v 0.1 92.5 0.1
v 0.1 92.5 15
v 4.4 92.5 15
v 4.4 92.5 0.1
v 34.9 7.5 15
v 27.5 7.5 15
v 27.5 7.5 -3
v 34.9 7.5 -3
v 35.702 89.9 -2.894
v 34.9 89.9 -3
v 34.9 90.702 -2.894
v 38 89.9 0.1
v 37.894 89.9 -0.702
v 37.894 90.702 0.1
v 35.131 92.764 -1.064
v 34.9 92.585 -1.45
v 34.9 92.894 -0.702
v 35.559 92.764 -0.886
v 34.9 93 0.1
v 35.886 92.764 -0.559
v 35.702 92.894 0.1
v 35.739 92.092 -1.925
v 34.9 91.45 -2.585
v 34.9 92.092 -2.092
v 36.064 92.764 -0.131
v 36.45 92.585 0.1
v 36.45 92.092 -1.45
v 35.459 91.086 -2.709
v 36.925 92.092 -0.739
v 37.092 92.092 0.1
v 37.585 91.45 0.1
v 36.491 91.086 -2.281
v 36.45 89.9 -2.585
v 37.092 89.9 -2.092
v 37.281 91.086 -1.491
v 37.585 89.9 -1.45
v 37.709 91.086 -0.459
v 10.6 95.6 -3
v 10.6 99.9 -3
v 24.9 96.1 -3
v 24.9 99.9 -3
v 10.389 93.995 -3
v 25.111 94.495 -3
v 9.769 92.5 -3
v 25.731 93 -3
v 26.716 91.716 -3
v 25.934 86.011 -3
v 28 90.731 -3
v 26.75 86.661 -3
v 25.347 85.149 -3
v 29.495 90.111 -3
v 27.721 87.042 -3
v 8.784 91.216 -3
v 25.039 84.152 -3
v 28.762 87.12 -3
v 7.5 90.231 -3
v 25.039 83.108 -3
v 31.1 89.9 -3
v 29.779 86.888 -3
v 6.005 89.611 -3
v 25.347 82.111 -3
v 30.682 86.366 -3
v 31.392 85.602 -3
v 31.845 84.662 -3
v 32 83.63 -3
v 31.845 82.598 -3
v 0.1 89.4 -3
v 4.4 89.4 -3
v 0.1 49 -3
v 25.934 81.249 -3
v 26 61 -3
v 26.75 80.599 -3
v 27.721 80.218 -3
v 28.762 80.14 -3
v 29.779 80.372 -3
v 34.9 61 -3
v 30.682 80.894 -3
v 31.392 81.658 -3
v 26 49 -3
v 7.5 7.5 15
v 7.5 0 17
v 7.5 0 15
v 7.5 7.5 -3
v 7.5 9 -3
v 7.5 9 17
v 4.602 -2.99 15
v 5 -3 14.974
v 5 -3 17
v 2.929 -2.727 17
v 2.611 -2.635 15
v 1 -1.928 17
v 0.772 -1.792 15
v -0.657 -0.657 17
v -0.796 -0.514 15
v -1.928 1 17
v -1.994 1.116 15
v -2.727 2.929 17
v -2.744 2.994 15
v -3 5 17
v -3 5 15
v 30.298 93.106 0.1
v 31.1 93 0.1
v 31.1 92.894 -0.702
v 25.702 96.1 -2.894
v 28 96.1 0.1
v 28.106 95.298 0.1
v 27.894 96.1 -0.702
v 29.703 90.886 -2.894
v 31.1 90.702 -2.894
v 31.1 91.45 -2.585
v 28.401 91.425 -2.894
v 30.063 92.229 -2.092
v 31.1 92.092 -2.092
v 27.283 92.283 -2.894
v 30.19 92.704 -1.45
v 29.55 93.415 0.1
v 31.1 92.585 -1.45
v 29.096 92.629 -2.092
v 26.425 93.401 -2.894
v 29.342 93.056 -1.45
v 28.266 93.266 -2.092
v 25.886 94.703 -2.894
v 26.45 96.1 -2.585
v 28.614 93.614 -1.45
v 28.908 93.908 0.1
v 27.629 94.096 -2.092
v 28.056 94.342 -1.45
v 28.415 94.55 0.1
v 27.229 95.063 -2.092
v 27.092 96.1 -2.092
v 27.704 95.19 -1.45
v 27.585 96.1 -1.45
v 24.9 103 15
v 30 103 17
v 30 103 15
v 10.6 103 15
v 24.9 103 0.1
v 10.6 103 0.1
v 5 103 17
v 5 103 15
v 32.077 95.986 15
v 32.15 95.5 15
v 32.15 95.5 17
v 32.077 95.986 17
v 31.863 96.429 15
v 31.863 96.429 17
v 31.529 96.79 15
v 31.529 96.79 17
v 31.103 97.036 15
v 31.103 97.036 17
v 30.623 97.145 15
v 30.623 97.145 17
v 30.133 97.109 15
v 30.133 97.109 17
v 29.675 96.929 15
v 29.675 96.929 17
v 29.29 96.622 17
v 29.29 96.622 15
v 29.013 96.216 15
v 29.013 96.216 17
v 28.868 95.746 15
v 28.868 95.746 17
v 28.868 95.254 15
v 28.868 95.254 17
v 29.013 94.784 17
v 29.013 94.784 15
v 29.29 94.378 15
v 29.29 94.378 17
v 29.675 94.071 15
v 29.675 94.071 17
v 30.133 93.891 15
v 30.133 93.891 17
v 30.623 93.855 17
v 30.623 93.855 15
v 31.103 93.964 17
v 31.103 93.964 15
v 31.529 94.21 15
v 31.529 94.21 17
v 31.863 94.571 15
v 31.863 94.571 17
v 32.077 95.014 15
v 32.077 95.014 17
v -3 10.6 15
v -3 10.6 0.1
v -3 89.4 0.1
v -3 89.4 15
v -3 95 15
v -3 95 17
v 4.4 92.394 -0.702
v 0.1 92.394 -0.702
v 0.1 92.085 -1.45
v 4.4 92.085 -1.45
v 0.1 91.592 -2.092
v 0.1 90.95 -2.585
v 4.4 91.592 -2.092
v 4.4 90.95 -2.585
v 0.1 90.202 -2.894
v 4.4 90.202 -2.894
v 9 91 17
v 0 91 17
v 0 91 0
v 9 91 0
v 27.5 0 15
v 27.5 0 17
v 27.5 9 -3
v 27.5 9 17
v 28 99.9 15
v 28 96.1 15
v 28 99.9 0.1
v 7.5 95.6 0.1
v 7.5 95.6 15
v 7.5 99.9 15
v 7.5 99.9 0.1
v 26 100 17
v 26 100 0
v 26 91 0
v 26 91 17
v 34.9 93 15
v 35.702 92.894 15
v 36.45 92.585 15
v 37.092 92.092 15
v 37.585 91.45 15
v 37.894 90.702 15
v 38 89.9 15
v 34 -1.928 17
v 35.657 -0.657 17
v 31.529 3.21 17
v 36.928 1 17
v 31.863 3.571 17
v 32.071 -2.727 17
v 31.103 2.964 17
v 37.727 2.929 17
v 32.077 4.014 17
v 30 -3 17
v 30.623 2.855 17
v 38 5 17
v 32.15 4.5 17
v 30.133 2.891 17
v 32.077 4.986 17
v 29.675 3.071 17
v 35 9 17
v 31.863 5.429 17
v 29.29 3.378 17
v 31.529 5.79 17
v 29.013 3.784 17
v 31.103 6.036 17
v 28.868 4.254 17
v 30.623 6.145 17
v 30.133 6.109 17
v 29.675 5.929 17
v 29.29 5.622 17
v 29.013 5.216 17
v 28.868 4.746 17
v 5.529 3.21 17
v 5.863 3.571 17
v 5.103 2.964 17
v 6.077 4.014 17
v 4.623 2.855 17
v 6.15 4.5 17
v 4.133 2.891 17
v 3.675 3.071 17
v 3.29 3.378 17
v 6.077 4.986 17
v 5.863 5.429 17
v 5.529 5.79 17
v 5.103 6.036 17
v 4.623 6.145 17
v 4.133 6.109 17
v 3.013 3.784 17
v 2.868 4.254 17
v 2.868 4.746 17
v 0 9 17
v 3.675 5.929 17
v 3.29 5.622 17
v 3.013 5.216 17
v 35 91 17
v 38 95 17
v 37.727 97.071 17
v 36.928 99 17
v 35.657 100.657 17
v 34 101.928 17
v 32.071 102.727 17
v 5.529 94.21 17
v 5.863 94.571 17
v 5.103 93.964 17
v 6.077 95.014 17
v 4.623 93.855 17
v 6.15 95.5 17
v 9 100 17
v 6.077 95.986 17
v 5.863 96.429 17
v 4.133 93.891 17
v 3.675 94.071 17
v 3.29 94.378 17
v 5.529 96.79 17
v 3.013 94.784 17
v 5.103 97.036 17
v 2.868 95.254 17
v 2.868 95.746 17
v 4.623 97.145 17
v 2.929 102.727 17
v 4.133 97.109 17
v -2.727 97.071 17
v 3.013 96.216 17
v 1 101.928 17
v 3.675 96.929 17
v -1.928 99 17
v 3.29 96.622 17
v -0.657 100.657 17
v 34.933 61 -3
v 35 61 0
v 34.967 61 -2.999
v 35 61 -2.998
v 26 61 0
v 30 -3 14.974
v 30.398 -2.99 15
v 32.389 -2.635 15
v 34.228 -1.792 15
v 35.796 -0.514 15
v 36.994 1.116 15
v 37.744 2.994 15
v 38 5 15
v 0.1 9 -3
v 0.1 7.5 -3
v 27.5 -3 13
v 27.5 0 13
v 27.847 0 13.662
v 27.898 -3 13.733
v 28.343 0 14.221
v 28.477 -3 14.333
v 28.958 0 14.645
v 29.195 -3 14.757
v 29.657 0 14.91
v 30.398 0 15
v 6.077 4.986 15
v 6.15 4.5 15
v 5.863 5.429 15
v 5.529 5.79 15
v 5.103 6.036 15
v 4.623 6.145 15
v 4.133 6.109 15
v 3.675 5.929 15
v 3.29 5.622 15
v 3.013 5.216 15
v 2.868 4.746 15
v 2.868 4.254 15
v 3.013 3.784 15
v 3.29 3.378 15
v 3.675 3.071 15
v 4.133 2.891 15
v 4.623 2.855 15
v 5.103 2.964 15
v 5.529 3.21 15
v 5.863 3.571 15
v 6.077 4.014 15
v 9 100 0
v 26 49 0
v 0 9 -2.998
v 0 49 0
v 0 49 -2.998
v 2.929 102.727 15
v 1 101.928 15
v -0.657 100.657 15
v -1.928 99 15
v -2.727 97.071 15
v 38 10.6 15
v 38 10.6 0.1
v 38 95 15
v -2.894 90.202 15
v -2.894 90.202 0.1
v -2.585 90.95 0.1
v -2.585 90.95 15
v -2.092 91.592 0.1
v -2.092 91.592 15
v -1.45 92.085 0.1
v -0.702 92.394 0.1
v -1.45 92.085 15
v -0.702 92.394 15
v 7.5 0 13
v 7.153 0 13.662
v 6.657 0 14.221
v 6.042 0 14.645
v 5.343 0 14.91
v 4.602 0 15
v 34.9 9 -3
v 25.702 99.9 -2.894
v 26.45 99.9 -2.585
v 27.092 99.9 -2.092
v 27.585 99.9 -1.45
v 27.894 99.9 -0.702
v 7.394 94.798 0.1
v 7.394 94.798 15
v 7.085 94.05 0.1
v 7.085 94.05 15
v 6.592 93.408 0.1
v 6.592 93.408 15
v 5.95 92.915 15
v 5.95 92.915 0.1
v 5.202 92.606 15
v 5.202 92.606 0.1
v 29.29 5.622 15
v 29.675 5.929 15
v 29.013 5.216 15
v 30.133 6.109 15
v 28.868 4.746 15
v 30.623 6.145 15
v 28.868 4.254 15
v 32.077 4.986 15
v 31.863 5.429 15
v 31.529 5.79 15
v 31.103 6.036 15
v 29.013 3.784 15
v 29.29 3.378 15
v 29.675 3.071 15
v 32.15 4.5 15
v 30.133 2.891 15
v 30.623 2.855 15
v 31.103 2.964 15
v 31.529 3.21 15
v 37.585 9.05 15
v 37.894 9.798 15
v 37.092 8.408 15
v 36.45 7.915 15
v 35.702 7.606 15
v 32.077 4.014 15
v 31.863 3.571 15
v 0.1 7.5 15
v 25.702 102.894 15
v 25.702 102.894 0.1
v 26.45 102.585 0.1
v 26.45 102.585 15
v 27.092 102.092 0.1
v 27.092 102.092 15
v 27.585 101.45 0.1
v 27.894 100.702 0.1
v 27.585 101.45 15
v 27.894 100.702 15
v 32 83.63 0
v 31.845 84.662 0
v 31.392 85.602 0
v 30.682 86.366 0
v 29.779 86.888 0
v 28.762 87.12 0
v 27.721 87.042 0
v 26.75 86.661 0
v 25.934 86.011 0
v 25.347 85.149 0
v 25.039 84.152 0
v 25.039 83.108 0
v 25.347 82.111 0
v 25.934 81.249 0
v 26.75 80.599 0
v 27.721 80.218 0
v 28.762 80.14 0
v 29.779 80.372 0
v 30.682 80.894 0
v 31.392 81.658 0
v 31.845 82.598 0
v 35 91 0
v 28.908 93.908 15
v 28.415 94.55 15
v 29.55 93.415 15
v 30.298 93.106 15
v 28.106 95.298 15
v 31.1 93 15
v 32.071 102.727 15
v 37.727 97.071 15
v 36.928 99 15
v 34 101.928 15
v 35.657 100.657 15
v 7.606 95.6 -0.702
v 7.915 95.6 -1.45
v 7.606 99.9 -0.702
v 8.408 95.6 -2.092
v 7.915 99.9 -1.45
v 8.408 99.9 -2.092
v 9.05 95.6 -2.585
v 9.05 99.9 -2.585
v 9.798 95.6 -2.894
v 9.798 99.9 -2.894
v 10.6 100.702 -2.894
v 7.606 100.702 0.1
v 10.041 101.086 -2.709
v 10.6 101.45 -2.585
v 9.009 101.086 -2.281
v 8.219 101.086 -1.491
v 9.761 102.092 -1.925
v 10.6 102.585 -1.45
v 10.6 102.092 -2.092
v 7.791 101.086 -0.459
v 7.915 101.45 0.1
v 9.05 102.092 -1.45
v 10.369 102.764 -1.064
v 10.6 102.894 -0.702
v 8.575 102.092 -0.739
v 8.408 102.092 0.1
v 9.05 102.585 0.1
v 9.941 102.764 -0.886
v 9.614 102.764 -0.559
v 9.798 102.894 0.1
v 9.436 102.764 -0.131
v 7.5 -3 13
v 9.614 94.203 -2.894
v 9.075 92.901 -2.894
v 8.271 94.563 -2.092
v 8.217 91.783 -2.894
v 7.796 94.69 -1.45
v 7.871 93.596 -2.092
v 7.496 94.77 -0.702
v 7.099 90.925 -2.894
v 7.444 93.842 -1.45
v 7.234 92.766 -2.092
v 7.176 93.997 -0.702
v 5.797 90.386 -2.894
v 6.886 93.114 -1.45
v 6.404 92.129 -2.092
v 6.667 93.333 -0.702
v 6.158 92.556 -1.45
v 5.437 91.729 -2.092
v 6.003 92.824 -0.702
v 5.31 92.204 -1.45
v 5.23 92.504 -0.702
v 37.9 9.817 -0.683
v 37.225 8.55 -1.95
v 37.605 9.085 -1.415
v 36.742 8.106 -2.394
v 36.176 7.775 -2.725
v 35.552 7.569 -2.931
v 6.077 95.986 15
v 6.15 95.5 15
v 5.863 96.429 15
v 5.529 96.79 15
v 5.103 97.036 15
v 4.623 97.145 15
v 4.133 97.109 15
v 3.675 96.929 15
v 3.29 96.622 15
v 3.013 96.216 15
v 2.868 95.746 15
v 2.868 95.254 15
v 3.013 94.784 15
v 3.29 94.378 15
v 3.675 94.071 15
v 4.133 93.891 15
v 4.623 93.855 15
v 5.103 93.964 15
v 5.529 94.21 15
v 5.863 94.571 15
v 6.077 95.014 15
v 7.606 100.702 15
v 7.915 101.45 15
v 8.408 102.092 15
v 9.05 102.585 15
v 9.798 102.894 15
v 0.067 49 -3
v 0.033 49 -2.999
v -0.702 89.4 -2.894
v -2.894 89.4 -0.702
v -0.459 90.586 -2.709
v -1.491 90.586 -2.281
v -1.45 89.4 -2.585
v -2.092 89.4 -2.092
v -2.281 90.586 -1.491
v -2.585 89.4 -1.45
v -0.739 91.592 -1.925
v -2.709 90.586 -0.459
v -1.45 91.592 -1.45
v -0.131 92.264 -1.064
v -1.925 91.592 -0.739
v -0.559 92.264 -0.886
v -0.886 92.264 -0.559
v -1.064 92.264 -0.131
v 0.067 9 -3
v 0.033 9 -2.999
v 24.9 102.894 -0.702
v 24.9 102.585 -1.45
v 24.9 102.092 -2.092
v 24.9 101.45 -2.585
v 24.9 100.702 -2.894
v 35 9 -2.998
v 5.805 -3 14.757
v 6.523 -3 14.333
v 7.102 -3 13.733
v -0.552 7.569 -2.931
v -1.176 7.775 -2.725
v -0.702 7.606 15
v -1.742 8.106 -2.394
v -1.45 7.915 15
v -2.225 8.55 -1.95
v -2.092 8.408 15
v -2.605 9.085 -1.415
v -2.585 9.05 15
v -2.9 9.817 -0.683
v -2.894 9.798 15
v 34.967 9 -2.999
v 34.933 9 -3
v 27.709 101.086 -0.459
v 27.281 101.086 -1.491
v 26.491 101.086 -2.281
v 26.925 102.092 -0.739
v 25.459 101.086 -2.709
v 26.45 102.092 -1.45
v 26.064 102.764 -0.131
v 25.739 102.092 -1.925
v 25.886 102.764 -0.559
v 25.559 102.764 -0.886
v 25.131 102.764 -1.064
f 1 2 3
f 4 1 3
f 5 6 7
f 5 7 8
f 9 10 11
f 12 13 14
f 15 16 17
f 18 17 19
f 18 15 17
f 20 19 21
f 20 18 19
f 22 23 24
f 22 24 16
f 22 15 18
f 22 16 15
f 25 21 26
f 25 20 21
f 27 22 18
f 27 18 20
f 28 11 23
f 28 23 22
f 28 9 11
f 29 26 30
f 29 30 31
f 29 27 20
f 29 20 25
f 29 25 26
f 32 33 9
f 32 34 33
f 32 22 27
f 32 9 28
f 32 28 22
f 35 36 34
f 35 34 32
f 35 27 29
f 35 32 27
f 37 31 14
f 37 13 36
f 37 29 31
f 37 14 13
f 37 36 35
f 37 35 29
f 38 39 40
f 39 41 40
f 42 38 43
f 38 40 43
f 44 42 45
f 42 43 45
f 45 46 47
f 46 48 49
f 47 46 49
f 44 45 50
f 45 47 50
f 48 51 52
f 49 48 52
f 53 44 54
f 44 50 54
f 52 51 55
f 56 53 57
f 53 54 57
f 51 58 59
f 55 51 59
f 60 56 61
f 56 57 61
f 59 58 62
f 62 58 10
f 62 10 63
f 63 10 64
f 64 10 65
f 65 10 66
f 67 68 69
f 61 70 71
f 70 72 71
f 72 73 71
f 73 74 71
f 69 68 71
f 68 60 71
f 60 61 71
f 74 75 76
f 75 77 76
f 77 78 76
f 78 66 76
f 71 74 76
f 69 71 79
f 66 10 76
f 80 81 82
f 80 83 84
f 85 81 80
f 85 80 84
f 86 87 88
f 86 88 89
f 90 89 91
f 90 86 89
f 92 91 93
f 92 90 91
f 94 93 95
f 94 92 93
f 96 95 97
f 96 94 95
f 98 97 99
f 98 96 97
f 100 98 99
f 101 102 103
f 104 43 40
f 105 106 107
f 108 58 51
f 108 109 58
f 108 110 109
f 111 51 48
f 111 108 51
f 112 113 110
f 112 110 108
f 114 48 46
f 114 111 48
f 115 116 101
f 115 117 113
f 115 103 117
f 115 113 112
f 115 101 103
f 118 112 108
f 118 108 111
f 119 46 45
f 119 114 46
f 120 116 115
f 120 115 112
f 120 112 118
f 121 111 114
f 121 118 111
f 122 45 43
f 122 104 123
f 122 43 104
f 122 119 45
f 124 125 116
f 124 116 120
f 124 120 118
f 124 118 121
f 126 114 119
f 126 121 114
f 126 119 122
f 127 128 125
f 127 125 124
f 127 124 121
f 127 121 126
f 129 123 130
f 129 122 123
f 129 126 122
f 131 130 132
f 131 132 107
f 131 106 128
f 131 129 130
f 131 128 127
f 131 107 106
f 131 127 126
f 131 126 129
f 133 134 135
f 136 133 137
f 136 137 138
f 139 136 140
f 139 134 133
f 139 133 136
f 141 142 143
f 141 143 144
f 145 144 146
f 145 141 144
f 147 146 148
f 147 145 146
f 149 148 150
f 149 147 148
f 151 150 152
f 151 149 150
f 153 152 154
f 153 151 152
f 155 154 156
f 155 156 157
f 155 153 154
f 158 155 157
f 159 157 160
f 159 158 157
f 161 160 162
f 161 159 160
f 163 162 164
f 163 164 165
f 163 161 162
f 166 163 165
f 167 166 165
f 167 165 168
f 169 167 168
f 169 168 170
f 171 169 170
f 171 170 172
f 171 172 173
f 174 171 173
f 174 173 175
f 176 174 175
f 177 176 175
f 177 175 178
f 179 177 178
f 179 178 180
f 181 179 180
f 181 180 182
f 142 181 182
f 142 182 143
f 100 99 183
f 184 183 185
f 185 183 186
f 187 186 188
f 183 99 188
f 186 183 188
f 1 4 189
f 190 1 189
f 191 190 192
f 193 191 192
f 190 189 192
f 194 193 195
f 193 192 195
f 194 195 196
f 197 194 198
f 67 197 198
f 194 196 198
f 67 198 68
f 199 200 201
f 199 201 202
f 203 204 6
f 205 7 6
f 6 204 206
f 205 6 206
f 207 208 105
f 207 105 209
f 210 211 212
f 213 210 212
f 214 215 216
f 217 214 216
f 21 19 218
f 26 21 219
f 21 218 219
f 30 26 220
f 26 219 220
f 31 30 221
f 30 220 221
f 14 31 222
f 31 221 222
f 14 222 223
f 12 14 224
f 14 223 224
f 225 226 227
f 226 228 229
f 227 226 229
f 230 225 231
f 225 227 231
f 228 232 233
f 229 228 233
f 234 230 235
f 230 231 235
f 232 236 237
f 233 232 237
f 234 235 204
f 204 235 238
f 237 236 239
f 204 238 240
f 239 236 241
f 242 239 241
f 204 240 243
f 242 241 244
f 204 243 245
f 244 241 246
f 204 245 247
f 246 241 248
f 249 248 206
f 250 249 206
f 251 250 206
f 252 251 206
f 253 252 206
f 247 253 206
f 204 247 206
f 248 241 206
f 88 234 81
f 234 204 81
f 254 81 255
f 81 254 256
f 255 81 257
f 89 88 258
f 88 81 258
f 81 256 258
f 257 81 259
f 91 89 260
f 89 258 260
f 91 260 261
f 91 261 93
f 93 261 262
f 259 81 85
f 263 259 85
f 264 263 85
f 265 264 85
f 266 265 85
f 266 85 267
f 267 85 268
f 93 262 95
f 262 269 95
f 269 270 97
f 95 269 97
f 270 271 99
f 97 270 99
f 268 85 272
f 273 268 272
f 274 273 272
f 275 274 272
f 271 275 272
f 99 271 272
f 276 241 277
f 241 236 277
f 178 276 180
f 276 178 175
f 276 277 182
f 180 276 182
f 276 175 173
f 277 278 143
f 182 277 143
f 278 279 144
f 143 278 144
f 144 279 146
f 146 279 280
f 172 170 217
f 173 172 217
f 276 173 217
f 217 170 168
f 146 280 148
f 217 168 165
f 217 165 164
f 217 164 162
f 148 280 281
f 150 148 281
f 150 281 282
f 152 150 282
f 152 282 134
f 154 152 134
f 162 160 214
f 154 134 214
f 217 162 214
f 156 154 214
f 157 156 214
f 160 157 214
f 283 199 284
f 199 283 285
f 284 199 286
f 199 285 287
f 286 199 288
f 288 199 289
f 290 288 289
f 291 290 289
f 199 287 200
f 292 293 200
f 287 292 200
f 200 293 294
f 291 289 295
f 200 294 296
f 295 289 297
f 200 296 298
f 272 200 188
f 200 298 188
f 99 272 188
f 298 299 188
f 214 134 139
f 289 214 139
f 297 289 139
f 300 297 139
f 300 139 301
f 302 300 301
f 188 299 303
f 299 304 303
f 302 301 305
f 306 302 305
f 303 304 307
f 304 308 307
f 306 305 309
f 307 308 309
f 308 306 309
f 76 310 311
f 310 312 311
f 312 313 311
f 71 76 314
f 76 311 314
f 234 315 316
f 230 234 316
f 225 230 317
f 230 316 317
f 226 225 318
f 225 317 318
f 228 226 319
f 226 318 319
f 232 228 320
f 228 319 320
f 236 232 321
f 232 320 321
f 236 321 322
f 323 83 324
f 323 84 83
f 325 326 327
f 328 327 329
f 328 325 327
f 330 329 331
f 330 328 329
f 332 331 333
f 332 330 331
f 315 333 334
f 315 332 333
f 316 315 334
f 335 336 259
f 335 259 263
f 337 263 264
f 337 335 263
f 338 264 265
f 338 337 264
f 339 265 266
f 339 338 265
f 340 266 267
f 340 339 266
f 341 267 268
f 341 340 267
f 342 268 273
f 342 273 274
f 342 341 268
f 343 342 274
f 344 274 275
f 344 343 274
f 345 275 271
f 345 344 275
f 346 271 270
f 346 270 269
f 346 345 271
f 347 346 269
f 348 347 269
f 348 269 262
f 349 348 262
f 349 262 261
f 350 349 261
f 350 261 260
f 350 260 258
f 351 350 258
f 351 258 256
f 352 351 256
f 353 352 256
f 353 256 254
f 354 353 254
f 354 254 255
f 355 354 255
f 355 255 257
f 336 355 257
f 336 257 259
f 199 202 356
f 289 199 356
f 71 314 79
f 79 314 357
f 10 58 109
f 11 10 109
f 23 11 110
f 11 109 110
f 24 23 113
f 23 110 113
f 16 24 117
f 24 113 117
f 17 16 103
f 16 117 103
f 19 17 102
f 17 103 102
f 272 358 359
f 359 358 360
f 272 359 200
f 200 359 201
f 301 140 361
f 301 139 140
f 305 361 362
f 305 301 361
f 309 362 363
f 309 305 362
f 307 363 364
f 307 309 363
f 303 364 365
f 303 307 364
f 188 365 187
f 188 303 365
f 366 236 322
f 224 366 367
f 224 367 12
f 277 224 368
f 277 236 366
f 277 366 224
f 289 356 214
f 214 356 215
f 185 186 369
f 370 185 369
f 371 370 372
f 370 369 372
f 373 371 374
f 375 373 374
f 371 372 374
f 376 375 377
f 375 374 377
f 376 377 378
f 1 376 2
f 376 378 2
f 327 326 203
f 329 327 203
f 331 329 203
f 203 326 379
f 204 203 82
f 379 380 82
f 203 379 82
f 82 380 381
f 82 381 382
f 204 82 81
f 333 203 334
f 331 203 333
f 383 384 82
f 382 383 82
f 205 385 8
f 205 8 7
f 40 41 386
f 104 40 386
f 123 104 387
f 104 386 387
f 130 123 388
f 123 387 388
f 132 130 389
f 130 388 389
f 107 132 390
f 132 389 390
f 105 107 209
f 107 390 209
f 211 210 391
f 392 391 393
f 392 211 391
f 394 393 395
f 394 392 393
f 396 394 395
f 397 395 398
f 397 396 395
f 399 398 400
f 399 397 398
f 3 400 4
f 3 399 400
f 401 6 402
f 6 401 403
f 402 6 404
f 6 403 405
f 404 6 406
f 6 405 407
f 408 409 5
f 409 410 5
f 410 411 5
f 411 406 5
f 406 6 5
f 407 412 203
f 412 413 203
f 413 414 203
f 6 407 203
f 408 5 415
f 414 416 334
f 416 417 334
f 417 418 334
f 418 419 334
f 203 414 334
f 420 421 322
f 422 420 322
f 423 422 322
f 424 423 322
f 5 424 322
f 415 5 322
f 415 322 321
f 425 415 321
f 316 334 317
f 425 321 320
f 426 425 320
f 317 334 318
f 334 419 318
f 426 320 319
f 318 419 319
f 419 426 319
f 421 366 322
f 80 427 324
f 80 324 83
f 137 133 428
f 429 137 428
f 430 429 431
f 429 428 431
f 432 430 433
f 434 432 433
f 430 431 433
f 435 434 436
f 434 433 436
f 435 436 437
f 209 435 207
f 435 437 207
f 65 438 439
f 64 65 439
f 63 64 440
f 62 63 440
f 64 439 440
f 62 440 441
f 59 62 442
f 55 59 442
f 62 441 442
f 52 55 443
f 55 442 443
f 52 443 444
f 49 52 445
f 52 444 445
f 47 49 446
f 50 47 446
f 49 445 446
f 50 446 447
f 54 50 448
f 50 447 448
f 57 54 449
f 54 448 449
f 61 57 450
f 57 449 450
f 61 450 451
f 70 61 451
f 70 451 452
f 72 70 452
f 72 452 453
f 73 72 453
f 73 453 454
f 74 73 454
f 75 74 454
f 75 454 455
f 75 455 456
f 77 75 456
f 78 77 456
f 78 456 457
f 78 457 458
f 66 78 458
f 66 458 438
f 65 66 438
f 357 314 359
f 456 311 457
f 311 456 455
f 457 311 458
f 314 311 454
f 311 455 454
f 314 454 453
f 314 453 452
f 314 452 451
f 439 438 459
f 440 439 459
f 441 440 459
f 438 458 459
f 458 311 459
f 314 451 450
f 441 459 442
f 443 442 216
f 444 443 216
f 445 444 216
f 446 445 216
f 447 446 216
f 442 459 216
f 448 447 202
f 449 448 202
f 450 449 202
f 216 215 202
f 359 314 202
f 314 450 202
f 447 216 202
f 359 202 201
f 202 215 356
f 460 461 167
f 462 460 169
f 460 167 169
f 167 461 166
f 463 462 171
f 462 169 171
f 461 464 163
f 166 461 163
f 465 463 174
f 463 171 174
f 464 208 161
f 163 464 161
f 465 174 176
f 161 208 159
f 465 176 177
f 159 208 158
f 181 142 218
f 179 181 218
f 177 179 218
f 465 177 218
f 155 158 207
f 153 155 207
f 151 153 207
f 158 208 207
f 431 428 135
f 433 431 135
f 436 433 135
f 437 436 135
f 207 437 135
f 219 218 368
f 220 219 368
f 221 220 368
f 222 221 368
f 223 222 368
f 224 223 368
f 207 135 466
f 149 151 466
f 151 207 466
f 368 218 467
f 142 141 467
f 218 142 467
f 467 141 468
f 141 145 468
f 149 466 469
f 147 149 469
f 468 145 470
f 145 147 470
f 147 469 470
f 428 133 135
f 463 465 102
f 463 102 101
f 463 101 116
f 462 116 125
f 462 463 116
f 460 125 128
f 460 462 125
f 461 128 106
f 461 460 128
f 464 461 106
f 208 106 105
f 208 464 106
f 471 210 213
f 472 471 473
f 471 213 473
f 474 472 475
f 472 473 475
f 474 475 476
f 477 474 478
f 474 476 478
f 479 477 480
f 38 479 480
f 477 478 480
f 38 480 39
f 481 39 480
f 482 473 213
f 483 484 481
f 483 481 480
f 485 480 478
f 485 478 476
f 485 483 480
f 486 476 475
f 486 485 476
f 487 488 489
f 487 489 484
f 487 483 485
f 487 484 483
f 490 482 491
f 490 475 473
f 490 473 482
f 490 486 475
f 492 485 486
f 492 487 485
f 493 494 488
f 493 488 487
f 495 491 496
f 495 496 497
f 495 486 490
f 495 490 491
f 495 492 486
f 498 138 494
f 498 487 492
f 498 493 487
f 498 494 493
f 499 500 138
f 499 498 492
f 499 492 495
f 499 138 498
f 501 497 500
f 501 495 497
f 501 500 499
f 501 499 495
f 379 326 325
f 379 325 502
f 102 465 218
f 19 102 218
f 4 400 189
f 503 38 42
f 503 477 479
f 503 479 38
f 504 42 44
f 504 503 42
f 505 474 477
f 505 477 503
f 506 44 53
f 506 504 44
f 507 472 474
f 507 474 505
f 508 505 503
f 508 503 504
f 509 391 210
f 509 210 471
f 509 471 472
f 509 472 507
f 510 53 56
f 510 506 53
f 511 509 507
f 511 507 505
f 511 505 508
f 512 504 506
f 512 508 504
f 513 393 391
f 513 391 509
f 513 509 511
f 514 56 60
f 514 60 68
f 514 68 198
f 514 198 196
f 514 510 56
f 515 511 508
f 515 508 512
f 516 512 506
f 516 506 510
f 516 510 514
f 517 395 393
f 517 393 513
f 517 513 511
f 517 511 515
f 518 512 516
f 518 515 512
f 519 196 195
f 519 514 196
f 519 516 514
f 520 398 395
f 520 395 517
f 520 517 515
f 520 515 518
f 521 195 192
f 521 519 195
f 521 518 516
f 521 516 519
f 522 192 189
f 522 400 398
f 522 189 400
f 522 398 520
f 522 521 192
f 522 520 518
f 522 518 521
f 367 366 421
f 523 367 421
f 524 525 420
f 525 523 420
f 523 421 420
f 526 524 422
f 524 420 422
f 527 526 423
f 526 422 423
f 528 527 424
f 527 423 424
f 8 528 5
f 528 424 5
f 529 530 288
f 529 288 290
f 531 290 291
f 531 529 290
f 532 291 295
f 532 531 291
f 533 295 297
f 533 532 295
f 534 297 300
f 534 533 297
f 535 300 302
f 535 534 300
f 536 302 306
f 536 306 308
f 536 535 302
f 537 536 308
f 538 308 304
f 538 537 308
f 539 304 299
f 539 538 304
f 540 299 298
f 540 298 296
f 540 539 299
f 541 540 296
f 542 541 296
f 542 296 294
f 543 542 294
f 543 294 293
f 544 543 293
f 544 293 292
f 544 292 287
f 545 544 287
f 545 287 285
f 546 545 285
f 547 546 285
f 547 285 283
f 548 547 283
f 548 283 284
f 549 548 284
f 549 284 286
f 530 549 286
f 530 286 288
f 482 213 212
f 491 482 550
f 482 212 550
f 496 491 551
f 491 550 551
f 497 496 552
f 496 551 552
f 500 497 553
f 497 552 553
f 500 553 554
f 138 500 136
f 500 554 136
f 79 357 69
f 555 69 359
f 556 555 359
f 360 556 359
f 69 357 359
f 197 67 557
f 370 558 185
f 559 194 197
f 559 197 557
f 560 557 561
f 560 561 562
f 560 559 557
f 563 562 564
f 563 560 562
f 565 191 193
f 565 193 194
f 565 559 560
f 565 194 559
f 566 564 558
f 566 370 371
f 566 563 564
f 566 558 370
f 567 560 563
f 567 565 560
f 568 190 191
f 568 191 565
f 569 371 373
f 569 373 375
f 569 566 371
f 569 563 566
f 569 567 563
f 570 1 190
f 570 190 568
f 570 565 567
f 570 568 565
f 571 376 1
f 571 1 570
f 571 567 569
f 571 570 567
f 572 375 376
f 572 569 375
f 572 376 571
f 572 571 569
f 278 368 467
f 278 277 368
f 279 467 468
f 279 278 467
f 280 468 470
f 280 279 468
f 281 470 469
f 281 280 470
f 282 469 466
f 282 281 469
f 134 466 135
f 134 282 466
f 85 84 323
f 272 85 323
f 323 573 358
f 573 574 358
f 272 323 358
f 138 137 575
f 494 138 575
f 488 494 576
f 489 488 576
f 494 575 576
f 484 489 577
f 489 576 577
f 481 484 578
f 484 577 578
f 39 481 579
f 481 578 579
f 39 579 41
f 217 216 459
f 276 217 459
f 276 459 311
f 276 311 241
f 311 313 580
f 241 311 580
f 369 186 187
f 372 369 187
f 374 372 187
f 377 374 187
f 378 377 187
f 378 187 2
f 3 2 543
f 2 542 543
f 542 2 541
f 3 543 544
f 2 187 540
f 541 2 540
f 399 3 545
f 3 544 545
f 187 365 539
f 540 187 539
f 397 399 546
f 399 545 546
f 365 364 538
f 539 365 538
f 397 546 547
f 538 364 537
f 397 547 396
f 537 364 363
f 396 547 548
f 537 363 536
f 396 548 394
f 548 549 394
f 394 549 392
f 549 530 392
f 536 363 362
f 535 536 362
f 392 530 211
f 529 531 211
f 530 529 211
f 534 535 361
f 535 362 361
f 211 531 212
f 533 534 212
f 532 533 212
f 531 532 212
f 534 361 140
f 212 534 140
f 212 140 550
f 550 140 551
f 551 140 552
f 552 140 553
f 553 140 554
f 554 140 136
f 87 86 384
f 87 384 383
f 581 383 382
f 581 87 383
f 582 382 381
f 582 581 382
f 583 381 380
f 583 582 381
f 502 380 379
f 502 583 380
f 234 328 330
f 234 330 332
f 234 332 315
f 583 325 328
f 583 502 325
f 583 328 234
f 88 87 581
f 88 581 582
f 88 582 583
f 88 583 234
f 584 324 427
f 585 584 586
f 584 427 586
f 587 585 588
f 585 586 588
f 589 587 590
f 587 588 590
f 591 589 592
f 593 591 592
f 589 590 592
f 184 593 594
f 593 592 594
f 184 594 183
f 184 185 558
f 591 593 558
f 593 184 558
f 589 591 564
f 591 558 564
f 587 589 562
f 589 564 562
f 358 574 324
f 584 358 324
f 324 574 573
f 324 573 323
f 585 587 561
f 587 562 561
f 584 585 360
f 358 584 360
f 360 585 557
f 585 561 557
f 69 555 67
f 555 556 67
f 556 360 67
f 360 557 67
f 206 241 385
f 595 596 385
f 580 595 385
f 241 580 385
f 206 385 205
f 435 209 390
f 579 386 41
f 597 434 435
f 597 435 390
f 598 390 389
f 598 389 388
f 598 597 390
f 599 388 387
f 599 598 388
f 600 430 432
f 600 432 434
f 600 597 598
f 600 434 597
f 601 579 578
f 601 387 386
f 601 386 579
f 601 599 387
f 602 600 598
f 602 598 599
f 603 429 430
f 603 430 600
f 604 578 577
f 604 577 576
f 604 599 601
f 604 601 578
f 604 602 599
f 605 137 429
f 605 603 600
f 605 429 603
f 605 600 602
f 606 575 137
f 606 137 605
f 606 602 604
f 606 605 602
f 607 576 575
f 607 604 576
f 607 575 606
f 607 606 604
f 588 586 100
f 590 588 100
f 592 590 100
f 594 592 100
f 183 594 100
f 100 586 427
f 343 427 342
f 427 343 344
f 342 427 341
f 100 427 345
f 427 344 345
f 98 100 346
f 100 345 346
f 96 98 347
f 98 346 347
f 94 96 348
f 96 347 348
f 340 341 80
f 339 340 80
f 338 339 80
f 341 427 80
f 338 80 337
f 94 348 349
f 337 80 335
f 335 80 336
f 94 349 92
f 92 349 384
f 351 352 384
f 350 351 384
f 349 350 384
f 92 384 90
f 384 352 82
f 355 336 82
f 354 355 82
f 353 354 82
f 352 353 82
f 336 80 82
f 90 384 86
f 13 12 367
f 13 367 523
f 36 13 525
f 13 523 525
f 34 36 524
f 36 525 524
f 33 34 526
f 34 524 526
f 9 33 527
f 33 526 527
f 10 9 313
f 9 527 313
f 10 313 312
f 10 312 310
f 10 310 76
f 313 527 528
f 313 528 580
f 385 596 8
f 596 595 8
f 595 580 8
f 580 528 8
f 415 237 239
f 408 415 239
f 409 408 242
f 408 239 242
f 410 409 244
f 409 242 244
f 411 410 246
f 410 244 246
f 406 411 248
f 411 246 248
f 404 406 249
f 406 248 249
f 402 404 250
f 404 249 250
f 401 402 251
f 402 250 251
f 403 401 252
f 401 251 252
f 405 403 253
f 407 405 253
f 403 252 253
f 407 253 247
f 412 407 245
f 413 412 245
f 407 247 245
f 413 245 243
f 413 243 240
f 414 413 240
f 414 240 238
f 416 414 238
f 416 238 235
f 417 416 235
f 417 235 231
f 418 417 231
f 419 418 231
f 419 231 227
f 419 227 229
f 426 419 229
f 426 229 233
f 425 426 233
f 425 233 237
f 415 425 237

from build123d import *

# Parameters (mm, degrees)
SKETCH_2_W          = 41
SKETCH_2_H          = 106
SKETCH_2_R          = 1.65
EXTRUDE_3_DEPTH     = 17
SKETCH_5_R          = 1.65
CUT_EXTRUDE_2_DEPTH = 112.094554322
SKETCH_6_W          = 41
SKETCH_6_H          = 106
EXTRUDE_4_DEPTH     = 3
CUT_EXTRUDE_START   = -2
SKETCH_7_W          = 10.5
SKETCH_7_H          = 10.5
SKETCH_7_W_2        = 10
SKETCH_7_H_2        = 10
CUT_EXTRUDE_3_DEPTH = 110.593010534
SKETCH_9_W          = 1.5
SKETCH_9_H          = 9
CUT_EXTRUDE_4_DEPTH = 112.593010534
SKETCH_10_R         = 3.5
CUT_EXTRUDE_7_DEPTH = 112.094554322
SKETCH_12_W         = 20
SKETCH_12_H         = 3
CUT_EXTRUDE_8_DEPTH = 16
CUT_EXTRUDE_9_DEPTH = 112.094554322
FILLET_1_R          = 3.1
FILLET_2_R          = 3.1
FILLET_3_R          = 3.1
FILLET_4_R          = 8


with BuildPart() as part:
    # 草图2 → 凸台-拉伸3 (new body)
    with BuildSketch(Plane.XY):
        with Locations((17.5, 50)):
            Rectangle(SKETCH_2_W, SKETCH_2_H)
        Polygon((9, 0), (9, 9), (0, 9), (0, 91), (9, 91), (9, 100), (26, 100), (26, 91), (35, 91), (35, 9), (26, 9), (26, 0), align=None, mode=Mode.SUBTRACT)
        with Locations((4.5, 4.5)):
            Circle(SKETCH_2_R, mode=Mode.SUBTRACT)
        with Locations((4.5, 95.5)):
            Circle(SKETCH_2_R, mode=Mode.SUBTRACT)
        with Locations((30.5, 95.5)):
            Circle(SKETCH_2_R, mode=Mode.SUBTRACT)
    extrude(amount=EXTRUDE_3_DEPTH)

    # 草图5 → 切除-拉伸2 (cut, through all)
    with BuildSketch(Plane.XY.offset(17)):
        with Locations((30.5, 4.5)):
            Circle(SKETCH_5_R)
    extrude(amount=-CUT_EXTRUDE_2_DEPTH, mode=Mode.SUBTRACT)

    # 草图6 → 凸台-拉伸4 (add)
    with BuildSketch(Plane(origin=(0, 0, 0), x_dir=(-1, 0, 0), z_dir=(0, 0, -1))):
        with Locations((-17.5, 50)):
            Rectangle(SKETCH_6_W, SKETCH_6_H)
    extrude(amount=EXTRUDE_4_DEPTH)

    # 草图7 → 切除-拉伸3 (cut, through all)
    with BuildSketch(Plane.XY.offset(17).offset(CUT_EXTRUDE_START)):
        with Locations((2.25, 97.75)):
            Rectangle(SKETCH_7_W, SKETCH_7_H)
        with Locations((33, 98)):
            Rectangle(SKETCH_7_W_2, SKETCH_7_H_2)
        with Locations((2.25, 2.25)):
            Rectangle(SKETCH_7_W, SKETCH_7_H)
        with Locations((32.75, 2.25)):
            Rectangle(SKETCH_7_W, SKETCH_7_H)
    extrude(amount=-CUT_EXTRUDE_3_DEPTH, mode=Mode.SUBTRACT)

    # 草图9 → 切除-拉伸4 (cut, through all)
    with BuildSketch(Plane.XY.offset(17)):
        with Locations((8.25, 4.5)):
            Rectangle(SKETCH_9_W, SKETCH_9_H)
        with Locations((26.75, 4.5)):
            Rectangle(SKETCH_9_W, SKETCH_9_H)
    extrude(amount=-CUT_EXTRUDE_4_DEPTH, mode=Mode.SUBTRACT)

    # 草图10 → 切除-拉伸7 (cut, through all)
    with BuildSketch(Plane.XY):
        with Locations((28.5, 83.63)):
            Circle(SKETCH_10_R)
    extrude(amount=-CUT_EXTRUDE_7_DEPTH, mode=Mode.SUBTRACT)

    # 草图12 → 切除-拉伸8 (cut)
    with BuildSketch(Plane(origin=(0, 0, -3), x_dir=(-1, 0, 0), z_dir=(0, 0, -1))):
        with Locations((-17.5, -1.5)):
            Rectangle(SKETCH_12_W, SKETCH_12_H)
    extrude(amount=-CUT_EXTRUDE_8_DEPTH, mode=Mode.SUBTRACT)

    # 草图13 → 切除-拉伸9 (cut, through all)
    with BuildSketch(Plane.XY):
        Polygon((0, 49), (0, 9), (9, 9), (9, 0), (26, 0), (26, 9), (35, 9), (35, 61), (26, 61), (26, 49), align=None)
    extrude(amount=-CUT_EXTRUDE_9_DEPTH, mode=Mode.SUBTRACT)

    # 圆角1
    # the kernel refuses this fillet: 3.1 mm, written as the material it takes off along each edge
    with BuildSketch(Plane(origin=(-3, 100.25, -3), x_dir=(0, 0, 1), z_dir=(0, -1, 0))) as fillet_1_piece_1:
        with BuildLine():
            CenterArc((FILLET_1_R, -FILLET_1_R), FILLET_1_R, 90, 90)
            Line((0, -FILLET_1_R), (0, 0))
            Line((0, 0), (FILLET_1_R, 0))
        make_face()
    extrude(amount=100.5, mode=Mode.SUBTRACT)
    with BuildSketch(Plane(origin=(38, -0.25, -3), x_dir=(0, 0, 1), z_dir=(0, 1, 0))) as fillet_1_piece_2:
        with BuildLine():
            CenterArc((FILLET_1_R, -FILLET_1_R), FILLET_1_R, 90, 90)
            Line((0, -FILLET_1_R), (0, 0))
            Line((0, 0), (FILLET_1_R, 0))
        make_face()
    extrude(amount=101, mode=Mode.SUBTRACT)

    # 圆角2
    # the kernel refuses this fillet: 3.1 mm, written as the material it adds along each edge
    with BuildSketch(Plane(origin=(7.5, -3, 15), x_dir=(-1, 0, 0), z_dir=(0, 1, 0))) as fillet_2_piece_1:
        with BuildLine():
            CenterArc((2.898275349, -3.1), FILLET_2_R, 90, 69.216440404)
            Line((0, -2), (0, 0))
            Line((0, 0), (2.898275349, 0))
        make_face()
    extrude(amount=3)
    with BuildSketch(Plane(origin=(27.5, -3, 15), x_dir=(0, 0, -1), z_dir=(0, 1, 0))) as fillet_2_piece_2:
        with BuildLine():
            CenterArc((3.1, -2.898275349), FILLET_2_R, 110.783559596, 69.216440404)
            Line((0, -2.898275349), (0, 0))
            Line((0, 0), (2, 0))
        make_face()
    extrude(amount=3)
    with BuildSketch(Plane(origin=(28, 93, 15), x_dir=(0, 1, 0), z_dir=(0, 0, -1))) as fillet_2_piece_3:
        with BuildLine():
            CenterArc((FILLET_2_R, FILLET_2_R), FILLET_2_R, 180, 90)
            Line((0, FILLET_2_R), (0, 0))
            Line((0, 0), (FILLET_2_R, 0))
        make_face()
    extrude(amount=18)
    with BuildSketch(Plane(origin=(7.5, 92.5, 22.75), x_dir=(-1, 0, 0), z_dir=(0, 0, -1))) as fillet_2_piece_4_section:
        with BuildLine():
            CenterArc((FILLET_2_R, FILLET_2_R), FILLET_2_R, 180, 90)
            Line((0, FILLET_2_R), (0, 0))
            Line((0, 0), (FILLET_2_R, 0))
        make_face()
    fillet_2_piece_4 = extrude(amount=25.75, mode=Mode.PRIVATE)
    fillet_2_piece_4 = split(fillet_2_piece_4, bisect_by=Plane(origin=(6.807559389, 93.192440611, 17), z_dir=(0, 0, -1)), keep=Keep.TOP, mode=Mode.PRIVATE)
    add(fillet_2_piece_4)

    # 圆角3
    # the kernel refuses this fillet: 3.1 mm, written as the material it takes off along each edge
    with BuildSketch(Plane(origin=(10.6, 99.9, 0.1), x_dir=(0, 0, -1), z_dir=(0, 1, 0))) as fillet_3_piece_1_section:
        Polygon((0, 0), (FILLET_3_R * 1.02, 0), (FILLET_3_R * 1.02, FILLET_3_R * 1.02), (0, FILLET_3_R * 1.02), align=None)
    fillet_3_piece_1 = extrude(amount=FILLET_3_R * 1.02, mode=Mode.PRIVATE)
    fillet_3_piece_1 = fillet_3_piece_1 - Plane(origin=(10.6, 99.9, 0.1), x_dir=(0.7071067811865475, 0, 0.7071067811865475), z_dir=(0, 1, 0)) * Sphere(FILLET_3_R, mode=Mode.PRIVATE)
    add(fillet_3_piece_1, mode=Mode.SUBTRACT)
    with BuildSketch(Plane(origin=(24.9, 99.9, 0.1), x_dir=(1, 0, 0), z_dir=(0, 1, 0))) as fillet_3_piece_2_section:
        Polygon((0, 0), (FILLET_3_R * 1.02, 0), (FILLET_3_R * 1.02, FILLET_3_R * 1.02), (0, FILLET_3_R * 1.02), align=None)
    fillet_3_piece_2 = extrude(amount=FILLET_3_R * 1.02, mode=Mode.PRIVATE)
    fillet_3_piece_2 = fillet_3_piece_2 - Plane(origin=(24.9, 99.9, 0.1), x_dir=(-0.7071067811865475, 0, 0.7071067811865475), z_dir=(0, 1, 0)) * Sphere(FILLET_3_R, mode=Mode.PRIVATE)
    add(fillet_3_piece_2, mode=Mode.SUBTRACT)
    with BuildSketch(Plane(origin=(7.5, 99.9, -3), x_dir=(1, 0, 0), z_dir=(0, -1, 0))) as fillet_3_piece_3:
        with BuildLine():
            CenterArc((FILLET_3_R, FILLET_3_R), FILLET_3_R, 180, 90)
            Line((0, FILLET_3_R), (0, 0))
            Line((0, 0), (FILLET_3_R, 0))
        make_face()
    extrude(amount=4.3, mode=Mode.SUBTRACT)
    with BuildSketch(Plane(origin=(4.4, 95.6, -3), x_dir=(1, 0, 0), z_dir=(0, 1, 0))) as fillet_3_piece_4:
        with BuildLine():
            CenterArc((3.1 + FILLET_3_R, -FILLET_3_R), FILLET_3_R, 90, 90)
            Line((3.1, -FILLET_3_R), (3.1, 0))
            Line((3.1, 0), (3.1 + FILLET_3_R, 0))
        make_face()
    revolve(axis=Axis((4.4, 95.6, -3), (0, 0, -1)), revolution_arc=90, mode=Mode.SUBTRACT)
    with BuildSketch(Plane(origin=(4.4, 92.5, -3), x_dir=(0, 0, 1), z_dir=(-1, 0, 0))) as fillet_3_piece_5:
        with BuildLine():
            CenterArc((FILLET_3_R, -FILLET_3_R), FILLET_3_R, 90, 90)
            Line((0, -FILLET_3_R), (0, 0))
            Line((0, 0), (FILLET_3_R, 0))
        make_face()
    extrude(amount=4.3, mode=Mode.SUBTRACT)
    with BuildSketch(Plane(origin=(0.1, 92.5, 0.1), x_dir=(0, 0, -1), z_dir=(1, 0, 0))) as fillet_3_piece_6:
        with BuildLine():
            CenterArc((3.1 - FILLET_3_R, -FILLET_3_R), FILLET_3_R, 0, 90)
            Line((3.1, -FILLET_3_R), (3.1, 0))
            Line((3.1, 0), (3.1 - FILLET_3_R, 0))
        make_face()
    revolve(axis=Axis((0.1, 92.5, 0.1), (0, 1, 0)), revolution_arc=90, mode=Mode.SUBTRACT)
    with BuildSketch(Plane(origin=(28, 99.9, -3), x_dir=(0, 0, 1), z_dir=(0, -1, 0))) as fillet_3_piece_7:
        with BuildLine():
            CenterArc((FILLET_3_R, FILLET_3_R), FILLET_3_R, 180, 90)
            Line((0, FILLET_3_R), (0, 0))
            Line((0, 0), (FILLET_3_R, 0))
        make_face()
    extrude(amount=3.8, mode=Mode.SUBTRACT)
    with BuildSketch(Plane(origin=(31.1, 96.1, -3), x_dir=(0, -1, 0), z_dir=(1, 0, 0))) as fillet_3_piece_8:
        with BuildLine():
            CenterArc((3.1 + FILLET_3_R, -FILLET_3_R), FILLET_3_R, 90, 90)
            Line((3.1, -FILLET_3_R), (3.1, 0))
            Line((3.1, 0), (3.1 + FILLET_3_R, 0))
        make_face()
    revolve(axis=Axis((31.1, 96.1, -3), (0, 0, -1)), revolution_arc=90, mode=Mode.SUBTRACT)
    with BuildSketch(Plane(origin=(31.1, 93, -3), x_dir=(0, -1, 0), z_dir=(1, 0, 0))) as fillet_3_piece_9:
        with BuildLine():
            CenterArc((FILLET_3_R, -FILLET_3_R), FILLET_3_R, 90, 90)
            Line((0, -FILLET_3_R), (0, 0))
            Line((0, 0), (FILLET_3_R, 0))
        make_face()
    extrude(amount=3.8, mode=Mode.SUBTRACT)
    with BuildSketch(Plane(origin=(34.9, 93, 0.1), x_dir=(0, 0, -1), z_dir=(-1, 0, 0))) as fillet_3_piece_10:
        with BuildLine():
            CenterArc((3.1 - FILLET_3_R, FILLET_3_R), FILLET_3_R, 270, 90)
            Line((3.1 - FILLET_3_R, 0), (3.1, 0))
            Line((3.1, 0), (3.1, FILLET_3_R))
        make_face()
    revolve(axis=Axis((34.9, 93, 0.1), (0, -1, 0)), revolution_arc=90, mode=Mode.SUBTRACT)
    with BuildSketch(Plane(origin=(28, 103, 15), x_dir=(-1, 0, 0), z_dir=(0, 0, -1)), Plane(origin=(-3, 92.5, 15), x_dir=(0, -1, 0), z_dir=(0, 0, -1))) as fillet_3_piece_11:
        with BuildLine():
            CenterArc((FILLET_3_R, -FILLET_3_R), FILLET_3_R, 90, 90)
            Line((0, -FILLET_3_R), (0, 0))
            Line((0, 0), (FILLET_3_R, 0))
        make_face()
    extrude(amount=14.9, mode=Mode.SUBTRACT)
    with BuildSketch(Plane(origin=(7.5, 103, 15), x_dir=(1, 0, 0), z_dir=(0, 0, -1)), Plane(origin=(38, 93, 15), x_dir=(0, -1, 0), z_dir=(0, 0, -1))) as fillet_3_piece_12:
        with BuildLine():
            CenterArc((FILLET_3_R, FILLET_3_R), FILLET_3_R, 180, 90)
            Line((0, FILLET_3_R), (0, 0))
            Line((0, 0), (FILLET_3_R, 0))
        make_face()
    extrude(amount=14.9, mode=Mode.SUBTRACT)
    with BuildSketch(Plane(origin=(24.9, 103, -3), x_dir=(0, 0, 1), z_dir=(-1, 0, 0))) as fillet_3_piece_13:
        with BuildLine():
            CenterArc((FILLET_3_R, -FILLET_3_R), FILLET_3_R, 90, 90)
            Line((0, -FILLET_3_R), (0, 0))
            Line((0, 0), (FILLET_3_R, 0))
        make_face()
    extrude(amount=14.3, mode=Mode.SUBTRACT)
    with BuildSketch(Plane(origin=(-3, 7.5, 15), x_dir=(0, 1, 0), z_dir=(0, 0, -1))) as fillet_3_piece_14:
        with BuildLine():
            CenterArc((FILLET_3_R, FILLET_3_R), FILLET_3_R, 180, 90)
            Line((0, FILLET_3_R), (0, 0))
            Line((0, 0), (FILLET_3_R, 0))
        make_face()
    extrude(amount=22.65, mode=Mode.SUBTRACT)
    with BuildSketch(Plane(origin=(38, 7.5, 15), x_dir=(0, 1, 0), z_dir=(0, 0, -1))) as fillet_3_piece_15:
        with BuildLine():
            CenterArc((FILLET_3_R, -FILLET_3_R), FILLET_3_R, 90, 90)
            Line((0, -FILLET_3_R), (0, 0))
            Line((0, 0), (FILLET_3_R, 0))
        make_face()
    extrude(amount=22.65, mode=Mode.SUBTRACT)

    # 圆角4
    fillet_4_edges = [part.edges().sort_by_distance(p)[0] for p in [
        (-3, 103, 16),
        (38, 103, 16),
        (38, -3, 16),
        (-3, -3, 16),
    ]]
    fillet(fillet_4_edges, radius=FILLET_4_R)


solid = part.part
